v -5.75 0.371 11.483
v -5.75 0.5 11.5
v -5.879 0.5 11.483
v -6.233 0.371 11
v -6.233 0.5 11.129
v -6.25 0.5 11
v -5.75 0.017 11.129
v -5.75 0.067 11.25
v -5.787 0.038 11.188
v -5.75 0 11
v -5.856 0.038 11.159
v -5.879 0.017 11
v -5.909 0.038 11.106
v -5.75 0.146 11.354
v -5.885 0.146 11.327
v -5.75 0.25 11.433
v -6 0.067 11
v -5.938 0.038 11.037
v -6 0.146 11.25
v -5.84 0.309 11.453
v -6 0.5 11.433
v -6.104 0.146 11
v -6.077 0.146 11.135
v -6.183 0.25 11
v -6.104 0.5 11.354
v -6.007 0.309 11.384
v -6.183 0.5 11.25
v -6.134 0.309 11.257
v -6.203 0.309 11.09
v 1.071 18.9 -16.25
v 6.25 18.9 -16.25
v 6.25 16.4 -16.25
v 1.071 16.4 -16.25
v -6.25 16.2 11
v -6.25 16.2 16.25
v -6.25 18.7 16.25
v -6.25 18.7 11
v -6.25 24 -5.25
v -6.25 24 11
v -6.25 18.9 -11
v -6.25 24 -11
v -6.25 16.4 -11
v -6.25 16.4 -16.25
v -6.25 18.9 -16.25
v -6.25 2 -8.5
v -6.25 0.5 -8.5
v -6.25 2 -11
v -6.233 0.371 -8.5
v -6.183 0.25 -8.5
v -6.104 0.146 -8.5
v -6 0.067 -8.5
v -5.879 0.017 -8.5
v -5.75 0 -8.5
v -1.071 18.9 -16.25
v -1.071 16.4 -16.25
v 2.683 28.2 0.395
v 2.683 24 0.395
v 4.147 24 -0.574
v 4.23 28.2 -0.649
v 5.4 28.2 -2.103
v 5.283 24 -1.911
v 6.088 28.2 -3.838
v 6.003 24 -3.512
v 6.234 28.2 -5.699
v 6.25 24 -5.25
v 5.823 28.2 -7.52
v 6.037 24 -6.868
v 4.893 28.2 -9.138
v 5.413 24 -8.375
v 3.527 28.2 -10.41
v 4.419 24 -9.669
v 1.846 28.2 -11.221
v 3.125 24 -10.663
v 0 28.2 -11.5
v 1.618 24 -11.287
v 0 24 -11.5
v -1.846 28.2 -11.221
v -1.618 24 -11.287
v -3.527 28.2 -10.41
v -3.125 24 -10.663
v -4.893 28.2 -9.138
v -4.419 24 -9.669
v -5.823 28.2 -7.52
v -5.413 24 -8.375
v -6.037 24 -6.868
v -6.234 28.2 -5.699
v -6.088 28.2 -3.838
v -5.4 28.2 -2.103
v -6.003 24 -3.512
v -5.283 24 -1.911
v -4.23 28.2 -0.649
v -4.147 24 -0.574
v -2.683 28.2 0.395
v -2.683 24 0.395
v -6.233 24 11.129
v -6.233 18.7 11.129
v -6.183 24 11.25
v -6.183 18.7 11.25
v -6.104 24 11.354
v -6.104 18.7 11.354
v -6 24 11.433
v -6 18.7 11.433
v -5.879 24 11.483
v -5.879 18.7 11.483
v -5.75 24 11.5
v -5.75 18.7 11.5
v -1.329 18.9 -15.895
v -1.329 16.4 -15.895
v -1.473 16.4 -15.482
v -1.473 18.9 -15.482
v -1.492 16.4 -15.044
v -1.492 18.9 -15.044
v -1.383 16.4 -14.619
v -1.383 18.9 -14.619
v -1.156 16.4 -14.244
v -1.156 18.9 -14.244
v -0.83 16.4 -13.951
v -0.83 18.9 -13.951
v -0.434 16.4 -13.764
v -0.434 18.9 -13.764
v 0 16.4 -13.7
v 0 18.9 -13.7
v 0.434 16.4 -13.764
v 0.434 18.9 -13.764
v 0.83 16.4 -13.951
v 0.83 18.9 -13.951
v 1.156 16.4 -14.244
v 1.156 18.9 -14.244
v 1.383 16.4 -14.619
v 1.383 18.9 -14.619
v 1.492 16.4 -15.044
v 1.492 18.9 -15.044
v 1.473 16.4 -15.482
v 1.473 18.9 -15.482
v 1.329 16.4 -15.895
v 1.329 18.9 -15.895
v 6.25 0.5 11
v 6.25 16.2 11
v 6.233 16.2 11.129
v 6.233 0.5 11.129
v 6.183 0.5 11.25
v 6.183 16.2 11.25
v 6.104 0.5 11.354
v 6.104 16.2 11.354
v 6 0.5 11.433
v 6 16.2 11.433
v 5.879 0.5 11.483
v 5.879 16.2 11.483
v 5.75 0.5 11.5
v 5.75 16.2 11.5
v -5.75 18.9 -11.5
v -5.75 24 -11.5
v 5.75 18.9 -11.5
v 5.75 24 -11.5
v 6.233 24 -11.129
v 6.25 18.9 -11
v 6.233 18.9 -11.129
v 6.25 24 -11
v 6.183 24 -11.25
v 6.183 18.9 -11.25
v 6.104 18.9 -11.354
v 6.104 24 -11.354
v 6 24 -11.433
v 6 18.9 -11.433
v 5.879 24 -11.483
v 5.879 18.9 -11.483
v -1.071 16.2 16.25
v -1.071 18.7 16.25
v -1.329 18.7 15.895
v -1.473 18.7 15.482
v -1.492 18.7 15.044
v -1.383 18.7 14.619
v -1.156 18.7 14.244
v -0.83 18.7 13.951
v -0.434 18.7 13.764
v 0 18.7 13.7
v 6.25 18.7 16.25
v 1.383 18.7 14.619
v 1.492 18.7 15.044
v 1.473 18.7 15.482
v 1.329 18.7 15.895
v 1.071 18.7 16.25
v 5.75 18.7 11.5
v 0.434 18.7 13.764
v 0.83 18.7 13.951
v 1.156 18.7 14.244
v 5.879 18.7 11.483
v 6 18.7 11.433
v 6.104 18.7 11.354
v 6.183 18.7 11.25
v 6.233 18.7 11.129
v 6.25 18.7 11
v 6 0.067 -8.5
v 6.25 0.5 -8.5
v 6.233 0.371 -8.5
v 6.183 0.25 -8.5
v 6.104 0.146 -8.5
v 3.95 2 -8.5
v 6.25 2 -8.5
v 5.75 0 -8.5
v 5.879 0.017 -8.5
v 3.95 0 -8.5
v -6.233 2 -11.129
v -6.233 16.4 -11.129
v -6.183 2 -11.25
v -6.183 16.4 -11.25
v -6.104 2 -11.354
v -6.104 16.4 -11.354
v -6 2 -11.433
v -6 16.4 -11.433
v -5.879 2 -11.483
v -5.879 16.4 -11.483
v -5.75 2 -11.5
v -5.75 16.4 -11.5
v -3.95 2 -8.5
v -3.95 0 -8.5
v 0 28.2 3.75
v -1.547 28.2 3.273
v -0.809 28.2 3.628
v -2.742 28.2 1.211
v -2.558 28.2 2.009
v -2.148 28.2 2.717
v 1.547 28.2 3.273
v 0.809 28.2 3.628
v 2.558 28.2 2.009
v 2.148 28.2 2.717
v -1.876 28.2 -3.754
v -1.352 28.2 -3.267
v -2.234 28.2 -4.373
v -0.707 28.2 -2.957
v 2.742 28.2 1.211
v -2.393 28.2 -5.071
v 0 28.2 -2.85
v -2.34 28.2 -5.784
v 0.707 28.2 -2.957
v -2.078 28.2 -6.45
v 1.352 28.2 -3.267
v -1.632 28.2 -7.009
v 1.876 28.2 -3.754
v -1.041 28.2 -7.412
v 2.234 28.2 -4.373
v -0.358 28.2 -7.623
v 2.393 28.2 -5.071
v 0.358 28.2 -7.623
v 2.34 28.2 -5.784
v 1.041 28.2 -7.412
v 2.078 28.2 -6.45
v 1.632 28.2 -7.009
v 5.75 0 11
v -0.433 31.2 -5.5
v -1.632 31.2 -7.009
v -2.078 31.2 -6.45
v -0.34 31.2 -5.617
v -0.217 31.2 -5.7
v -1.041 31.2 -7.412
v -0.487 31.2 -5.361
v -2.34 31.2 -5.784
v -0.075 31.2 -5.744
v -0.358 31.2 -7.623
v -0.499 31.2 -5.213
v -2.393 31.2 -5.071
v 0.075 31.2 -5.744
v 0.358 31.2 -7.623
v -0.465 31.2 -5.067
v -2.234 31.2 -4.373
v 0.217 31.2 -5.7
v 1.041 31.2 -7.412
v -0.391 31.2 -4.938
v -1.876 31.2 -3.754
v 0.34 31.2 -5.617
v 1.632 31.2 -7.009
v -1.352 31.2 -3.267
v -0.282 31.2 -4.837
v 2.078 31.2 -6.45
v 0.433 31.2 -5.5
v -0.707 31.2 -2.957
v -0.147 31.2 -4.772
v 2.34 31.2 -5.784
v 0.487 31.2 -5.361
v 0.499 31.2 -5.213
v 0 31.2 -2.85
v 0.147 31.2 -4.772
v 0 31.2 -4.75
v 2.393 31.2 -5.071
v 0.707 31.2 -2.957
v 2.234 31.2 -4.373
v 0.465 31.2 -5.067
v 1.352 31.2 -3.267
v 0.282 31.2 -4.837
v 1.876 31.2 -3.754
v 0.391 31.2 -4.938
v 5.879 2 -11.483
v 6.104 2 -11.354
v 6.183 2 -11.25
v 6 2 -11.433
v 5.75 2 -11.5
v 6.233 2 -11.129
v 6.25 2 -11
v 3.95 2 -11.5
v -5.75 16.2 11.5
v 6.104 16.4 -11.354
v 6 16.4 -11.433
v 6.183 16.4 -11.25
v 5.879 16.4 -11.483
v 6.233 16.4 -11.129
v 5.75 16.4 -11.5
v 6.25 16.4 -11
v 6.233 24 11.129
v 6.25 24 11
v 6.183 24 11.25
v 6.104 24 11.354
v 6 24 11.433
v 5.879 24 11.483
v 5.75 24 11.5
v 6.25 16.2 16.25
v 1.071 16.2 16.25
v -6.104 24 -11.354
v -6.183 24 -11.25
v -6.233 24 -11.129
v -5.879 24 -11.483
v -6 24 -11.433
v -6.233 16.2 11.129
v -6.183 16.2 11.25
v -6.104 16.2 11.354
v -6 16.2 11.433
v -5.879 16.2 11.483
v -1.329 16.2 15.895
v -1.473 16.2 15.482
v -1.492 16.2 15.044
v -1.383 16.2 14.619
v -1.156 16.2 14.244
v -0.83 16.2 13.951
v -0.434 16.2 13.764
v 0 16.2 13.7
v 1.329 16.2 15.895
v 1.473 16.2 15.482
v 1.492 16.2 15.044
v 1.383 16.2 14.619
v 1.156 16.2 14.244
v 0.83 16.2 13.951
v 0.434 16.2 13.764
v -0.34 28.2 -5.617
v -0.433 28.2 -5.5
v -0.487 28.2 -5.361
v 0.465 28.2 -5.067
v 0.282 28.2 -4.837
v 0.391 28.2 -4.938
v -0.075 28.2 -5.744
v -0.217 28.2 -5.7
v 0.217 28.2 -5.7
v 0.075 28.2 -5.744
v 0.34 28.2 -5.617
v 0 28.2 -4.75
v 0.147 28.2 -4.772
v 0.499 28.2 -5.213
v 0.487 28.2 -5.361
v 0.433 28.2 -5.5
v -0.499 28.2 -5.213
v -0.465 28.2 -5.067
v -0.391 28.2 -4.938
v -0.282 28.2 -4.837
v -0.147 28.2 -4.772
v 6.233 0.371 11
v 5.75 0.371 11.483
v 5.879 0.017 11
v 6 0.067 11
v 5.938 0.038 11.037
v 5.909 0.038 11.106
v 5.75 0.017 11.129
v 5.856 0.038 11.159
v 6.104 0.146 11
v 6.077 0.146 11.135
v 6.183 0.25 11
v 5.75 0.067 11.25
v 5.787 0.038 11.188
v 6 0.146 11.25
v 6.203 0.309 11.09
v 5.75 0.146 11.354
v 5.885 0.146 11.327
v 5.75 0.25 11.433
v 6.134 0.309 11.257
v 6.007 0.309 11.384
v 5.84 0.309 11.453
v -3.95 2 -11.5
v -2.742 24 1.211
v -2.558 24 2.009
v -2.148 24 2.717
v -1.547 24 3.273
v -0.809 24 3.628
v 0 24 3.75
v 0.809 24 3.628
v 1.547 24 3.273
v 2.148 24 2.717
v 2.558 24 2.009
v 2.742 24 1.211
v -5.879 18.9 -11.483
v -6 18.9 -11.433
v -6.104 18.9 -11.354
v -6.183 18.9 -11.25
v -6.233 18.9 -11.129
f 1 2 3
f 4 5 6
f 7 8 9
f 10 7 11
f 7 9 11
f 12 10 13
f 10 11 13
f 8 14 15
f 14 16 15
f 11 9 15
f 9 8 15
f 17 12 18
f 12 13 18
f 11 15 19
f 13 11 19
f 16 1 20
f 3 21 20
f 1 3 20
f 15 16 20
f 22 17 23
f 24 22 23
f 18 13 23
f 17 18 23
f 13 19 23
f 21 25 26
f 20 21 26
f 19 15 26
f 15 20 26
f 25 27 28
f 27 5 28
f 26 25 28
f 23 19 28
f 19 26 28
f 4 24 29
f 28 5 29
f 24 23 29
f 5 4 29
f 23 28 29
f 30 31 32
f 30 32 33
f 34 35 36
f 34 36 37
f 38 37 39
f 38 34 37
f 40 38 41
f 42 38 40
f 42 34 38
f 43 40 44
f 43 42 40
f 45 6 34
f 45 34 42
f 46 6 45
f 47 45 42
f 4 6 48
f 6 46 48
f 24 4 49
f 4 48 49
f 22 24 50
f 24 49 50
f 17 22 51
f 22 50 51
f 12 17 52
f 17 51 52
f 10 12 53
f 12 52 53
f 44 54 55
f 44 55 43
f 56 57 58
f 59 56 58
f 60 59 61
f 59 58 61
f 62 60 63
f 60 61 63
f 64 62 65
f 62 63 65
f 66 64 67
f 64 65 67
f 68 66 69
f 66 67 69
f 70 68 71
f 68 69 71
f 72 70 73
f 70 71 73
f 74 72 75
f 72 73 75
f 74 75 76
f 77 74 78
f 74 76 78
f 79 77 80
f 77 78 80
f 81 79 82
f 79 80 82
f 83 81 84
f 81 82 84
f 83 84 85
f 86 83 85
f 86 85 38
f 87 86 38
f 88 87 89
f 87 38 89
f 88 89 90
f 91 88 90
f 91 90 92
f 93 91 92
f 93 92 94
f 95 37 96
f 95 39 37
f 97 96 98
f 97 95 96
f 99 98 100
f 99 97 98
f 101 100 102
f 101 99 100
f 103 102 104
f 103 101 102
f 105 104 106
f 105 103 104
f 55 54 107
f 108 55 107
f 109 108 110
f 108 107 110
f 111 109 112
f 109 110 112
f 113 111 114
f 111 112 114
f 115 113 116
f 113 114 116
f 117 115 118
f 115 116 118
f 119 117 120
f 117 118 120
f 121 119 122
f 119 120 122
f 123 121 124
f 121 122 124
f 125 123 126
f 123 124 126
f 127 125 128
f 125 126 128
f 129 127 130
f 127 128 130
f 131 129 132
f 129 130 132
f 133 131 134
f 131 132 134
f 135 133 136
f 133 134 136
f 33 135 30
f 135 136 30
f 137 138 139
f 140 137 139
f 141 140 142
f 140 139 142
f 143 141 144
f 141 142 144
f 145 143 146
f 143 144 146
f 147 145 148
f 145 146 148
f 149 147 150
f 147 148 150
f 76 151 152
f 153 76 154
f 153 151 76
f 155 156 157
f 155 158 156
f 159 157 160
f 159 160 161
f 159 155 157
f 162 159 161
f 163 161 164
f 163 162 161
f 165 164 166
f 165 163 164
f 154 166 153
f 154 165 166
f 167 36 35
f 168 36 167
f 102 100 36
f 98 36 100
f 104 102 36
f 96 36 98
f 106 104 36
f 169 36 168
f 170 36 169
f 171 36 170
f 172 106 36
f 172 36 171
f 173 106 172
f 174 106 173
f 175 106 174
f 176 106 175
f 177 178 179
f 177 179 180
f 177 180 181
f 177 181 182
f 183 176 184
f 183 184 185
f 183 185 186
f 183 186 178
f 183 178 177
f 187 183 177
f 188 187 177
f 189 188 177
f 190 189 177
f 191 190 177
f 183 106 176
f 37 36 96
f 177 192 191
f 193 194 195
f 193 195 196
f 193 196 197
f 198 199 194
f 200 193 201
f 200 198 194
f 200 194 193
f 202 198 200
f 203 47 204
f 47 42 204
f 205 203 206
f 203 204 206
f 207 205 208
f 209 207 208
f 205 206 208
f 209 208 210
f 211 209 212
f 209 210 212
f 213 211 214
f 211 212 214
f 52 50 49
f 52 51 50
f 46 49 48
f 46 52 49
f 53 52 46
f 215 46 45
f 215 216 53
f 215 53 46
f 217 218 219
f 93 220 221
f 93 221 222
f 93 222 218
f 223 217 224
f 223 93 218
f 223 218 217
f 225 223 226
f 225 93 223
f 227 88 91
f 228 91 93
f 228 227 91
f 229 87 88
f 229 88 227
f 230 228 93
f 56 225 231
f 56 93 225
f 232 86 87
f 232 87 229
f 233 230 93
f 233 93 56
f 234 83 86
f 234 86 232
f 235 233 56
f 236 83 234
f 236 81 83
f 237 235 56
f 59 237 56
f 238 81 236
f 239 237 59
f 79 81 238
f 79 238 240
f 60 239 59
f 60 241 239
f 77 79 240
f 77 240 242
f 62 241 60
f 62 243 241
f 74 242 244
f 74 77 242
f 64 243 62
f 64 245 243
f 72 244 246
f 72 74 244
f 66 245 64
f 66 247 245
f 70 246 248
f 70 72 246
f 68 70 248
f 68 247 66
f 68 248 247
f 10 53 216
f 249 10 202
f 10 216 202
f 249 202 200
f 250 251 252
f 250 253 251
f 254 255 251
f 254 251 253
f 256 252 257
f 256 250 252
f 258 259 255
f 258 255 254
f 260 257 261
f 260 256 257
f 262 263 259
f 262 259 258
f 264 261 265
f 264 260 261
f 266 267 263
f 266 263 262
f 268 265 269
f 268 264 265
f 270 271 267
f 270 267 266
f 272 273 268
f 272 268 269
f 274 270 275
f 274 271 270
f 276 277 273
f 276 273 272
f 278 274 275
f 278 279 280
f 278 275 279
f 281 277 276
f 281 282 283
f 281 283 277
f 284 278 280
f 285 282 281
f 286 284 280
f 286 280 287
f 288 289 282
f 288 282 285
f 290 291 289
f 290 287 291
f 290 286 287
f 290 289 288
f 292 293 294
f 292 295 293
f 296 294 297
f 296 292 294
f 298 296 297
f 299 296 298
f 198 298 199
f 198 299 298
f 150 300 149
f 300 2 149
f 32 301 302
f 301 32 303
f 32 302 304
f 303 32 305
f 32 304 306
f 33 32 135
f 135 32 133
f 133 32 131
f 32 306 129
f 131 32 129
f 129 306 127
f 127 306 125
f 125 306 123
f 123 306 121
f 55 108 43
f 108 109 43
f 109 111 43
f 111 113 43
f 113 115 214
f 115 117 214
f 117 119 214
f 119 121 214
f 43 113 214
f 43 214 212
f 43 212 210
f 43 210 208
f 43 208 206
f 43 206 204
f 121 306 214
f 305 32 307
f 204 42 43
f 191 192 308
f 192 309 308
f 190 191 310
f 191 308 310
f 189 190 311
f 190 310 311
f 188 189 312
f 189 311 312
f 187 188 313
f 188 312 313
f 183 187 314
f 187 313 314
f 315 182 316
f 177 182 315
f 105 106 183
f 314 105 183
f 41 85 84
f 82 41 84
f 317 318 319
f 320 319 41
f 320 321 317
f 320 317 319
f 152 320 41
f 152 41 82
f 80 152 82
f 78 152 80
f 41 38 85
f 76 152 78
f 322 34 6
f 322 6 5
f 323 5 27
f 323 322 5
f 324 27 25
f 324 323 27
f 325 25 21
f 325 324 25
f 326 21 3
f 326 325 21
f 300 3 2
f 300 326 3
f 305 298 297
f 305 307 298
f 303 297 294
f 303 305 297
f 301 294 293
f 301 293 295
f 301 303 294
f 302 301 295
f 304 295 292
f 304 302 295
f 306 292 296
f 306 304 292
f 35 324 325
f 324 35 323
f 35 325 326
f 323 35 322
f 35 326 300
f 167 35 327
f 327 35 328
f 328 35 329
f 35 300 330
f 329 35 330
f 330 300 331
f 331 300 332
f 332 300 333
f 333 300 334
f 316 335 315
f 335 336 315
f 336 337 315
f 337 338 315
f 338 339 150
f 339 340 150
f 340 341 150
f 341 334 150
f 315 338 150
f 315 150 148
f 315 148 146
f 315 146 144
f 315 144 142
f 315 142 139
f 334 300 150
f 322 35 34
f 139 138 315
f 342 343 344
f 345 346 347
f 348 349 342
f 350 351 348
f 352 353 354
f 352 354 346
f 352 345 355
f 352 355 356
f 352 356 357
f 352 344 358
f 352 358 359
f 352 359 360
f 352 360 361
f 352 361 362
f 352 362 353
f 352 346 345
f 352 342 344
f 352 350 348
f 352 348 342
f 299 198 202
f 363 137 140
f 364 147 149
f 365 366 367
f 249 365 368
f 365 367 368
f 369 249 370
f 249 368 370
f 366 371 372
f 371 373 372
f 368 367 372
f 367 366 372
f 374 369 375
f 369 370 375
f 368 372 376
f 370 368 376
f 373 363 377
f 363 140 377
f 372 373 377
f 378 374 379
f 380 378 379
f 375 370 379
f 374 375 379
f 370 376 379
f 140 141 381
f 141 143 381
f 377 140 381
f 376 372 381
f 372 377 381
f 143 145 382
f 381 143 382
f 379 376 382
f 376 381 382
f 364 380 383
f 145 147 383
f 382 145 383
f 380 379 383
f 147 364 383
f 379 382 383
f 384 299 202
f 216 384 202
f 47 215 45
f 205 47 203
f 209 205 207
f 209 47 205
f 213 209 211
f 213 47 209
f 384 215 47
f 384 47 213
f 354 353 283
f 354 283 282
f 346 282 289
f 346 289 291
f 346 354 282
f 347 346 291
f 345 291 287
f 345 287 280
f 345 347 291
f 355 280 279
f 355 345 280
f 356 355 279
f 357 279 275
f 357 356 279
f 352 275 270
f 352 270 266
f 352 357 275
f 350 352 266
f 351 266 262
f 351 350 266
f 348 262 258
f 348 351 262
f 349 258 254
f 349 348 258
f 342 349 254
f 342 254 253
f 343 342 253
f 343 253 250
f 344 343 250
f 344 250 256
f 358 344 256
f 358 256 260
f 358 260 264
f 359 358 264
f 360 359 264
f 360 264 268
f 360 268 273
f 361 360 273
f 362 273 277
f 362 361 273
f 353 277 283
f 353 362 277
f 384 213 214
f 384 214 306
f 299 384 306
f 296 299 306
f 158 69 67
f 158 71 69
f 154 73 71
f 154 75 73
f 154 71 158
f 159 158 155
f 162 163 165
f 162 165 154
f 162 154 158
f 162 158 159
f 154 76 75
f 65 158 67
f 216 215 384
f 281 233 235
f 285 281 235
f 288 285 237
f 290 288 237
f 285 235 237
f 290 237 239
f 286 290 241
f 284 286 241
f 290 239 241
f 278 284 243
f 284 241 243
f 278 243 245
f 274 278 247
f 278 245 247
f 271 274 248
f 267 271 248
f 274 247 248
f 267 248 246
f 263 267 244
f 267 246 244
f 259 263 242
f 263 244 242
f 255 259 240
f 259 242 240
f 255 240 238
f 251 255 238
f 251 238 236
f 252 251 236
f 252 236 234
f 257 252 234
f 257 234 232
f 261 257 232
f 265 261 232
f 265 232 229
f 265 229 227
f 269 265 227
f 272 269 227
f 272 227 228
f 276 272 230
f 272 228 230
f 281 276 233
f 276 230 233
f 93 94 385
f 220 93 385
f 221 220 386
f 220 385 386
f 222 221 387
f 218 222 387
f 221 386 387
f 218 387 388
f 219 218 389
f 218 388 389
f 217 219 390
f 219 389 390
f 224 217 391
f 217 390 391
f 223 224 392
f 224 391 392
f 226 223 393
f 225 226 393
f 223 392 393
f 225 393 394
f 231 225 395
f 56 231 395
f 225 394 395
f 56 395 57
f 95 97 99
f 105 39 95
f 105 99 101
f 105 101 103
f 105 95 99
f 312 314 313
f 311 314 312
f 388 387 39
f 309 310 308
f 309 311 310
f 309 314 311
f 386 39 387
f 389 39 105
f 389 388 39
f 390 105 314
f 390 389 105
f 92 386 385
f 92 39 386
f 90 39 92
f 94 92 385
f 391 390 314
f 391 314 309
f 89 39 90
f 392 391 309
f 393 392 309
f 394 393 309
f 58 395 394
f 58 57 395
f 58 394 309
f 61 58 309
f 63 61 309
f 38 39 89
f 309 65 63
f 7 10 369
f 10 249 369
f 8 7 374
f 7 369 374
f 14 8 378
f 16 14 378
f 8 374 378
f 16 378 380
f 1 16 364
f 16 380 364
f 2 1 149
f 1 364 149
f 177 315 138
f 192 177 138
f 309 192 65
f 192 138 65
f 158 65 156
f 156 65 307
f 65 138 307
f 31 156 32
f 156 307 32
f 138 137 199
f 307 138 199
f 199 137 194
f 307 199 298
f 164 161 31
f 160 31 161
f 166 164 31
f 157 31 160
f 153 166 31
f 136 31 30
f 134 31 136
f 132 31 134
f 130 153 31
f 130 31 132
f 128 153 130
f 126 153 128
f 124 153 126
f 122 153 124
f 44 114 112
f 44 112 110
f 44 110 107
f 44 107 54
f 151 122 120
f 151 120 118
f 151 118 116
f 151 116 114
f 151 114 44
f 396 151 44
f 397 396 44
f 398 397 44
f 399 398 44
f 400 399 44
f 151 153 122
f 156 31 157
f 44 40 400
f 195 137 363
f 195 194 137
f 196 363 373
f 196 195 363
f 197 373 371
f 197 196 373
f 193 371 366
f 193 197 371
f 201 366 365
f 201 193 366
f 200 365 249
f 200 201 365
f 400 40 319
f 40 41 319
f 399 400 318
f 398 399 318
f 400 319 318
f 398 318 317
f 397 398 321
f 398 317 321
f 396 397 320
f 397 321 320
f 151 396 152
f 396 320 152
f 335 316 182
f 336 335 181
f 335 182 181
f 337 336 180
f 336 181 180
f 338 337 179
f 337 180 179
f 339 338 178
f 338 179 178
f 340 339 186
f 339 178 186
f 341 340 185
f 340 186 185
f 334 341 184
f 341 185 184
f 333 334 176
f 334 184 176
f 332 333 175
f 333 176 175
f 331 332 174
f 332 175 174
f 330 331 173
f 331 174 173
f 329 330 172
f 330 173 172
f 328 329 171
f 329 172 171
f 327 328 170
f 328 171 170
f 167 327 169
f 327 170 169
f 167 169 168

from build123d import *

# Parameters (mm, degrees)
SKETCH1_W               = 12.5
SKETCH1_H               = 23
BOSS_EXTRUDE1_DEPTH     = 24
BOSS_EXTRUDE2_DEPTH     = 4.2
SKETCH3_R               = 2.4
SKETCH3_R_2             = 0.5
BOSS_EXTRUDE3_DEPTH     = 3
SKETCH4_W               = 12.5
SKETCH4_H               = 2.5
BOSS_EXTRUDE4_DEPTH     = 4.75
SKETCH5_W               = 12.5
SKETCH5_H               = 2.5
BOSS_EXTRUDE5_DEPTH     = 4.75
CUT_EXTRUDE1_REACH      = 27.55
SKETCH6_R               = 1.5
CUT_EXTRUDE2_REACH      = 27.697
SKETCH8_R               = 1.5
CUT_EXTRUDE4_DEPTH      = 38.33299479
CUT_EXTRUDE6_DEPTH      = 38.33299479
CUT_EXTRUDE6_DEPTH_BACK = 2.3
CUT_EXTRUDE7_DEPTH      = 38.33299479
CUT_EXTRUDE7_DEPTH_BACK = 2.3
FILLET1_R               = 0.5


with BuildPart() as part:
    # Sketch1 → Boss-Extrude1 (new body)
    with BuildSketch(Plane(origin=(0, 0, 0), x_dir=(1, 0, 0), z_dir=(0, 1, 0))):
        Rectangle(SKETCH1_W, SKETCH1_H)
    extrude(amount=BOSS_EXTRUDE1_DEPTH)

    # Sketch2 → Boss-Extrude2 (add)
    with BuildSketch(Plane(origin=(0, 24, 0), x_dir=(1, 0, 0), z_dir=(0, 1, 0))):
        with BuildLine():
            ThreePointArc((2.682624648, -0.395), (0, 11.5), (-2.682624648, -0.395))
            ThreePointArc((-2.682624648, -0.395), (0, -3.75), (2.682624648, -0.395))
        make_face()
    extrude(amount=BOSS_EXTRUDE2_DEPTH)

    # Sketch3 → Boss-Extrude3 (add)
    with BuildSketch(Plane(origin=(0, 28.2, 0), x_dir=(1, 0, 0), z_dir=(0, 1, 0))):
        with Locations(Location((0, 5.25, 0), (0, 0, 270))):
            Circle(SKETCH3_R)
        with Locations(Location((0, 5.25, 0), (0, 0, 270))):
            Circle(SKETCH3_R_2, mode=Mode.SUBTRACT)
    extrude(amount=BOSS_EXTRUDE3_DEPTH)

    # Sketch4 → Boss-Extrude4 (add)
    with BuildSketch(Plane(origin=(0, 0, -11.5), x_dir=(-1, 0, 0), z_dir=(0, 0, -1))):
        with Locations((0, 17.65)):
            Rectangle(SKETCH4_W, SKETCH4_H)
    extrude(amount=BOSS_EXTRUDE4_DEPTH)

    # Sketch5 → Boss-Extrude5 (add)
    with BuildSketch(Plane.XY.offset(11.5)):
        with Locations((0, 17.45)):
            Rectangle(SKETCH5_W, SKETCH5_H)
    extrude(amount=BOSS_EXTRUDE5_DEPTH)

    # Sketch6 → Cut-Extrude1 (cut, up to next)
    with BuildSketch(Plane(origin=(0, 18.7, 0), x_dir=(1, 0, 0), z_dir=(0, 1, 0)), mode=Mode.PRIVATE) as cut_extrude1_sk1:
        with Locations((0, -15.2)):
            Circle(SKETCH6_R)
    cut_extrude1_tool1 = extrude(cut_extrude1_sk1.sketch, amount=-CUT_EXTRUDE1_REACH, mode=Mode.PRIVATE) & part.part
    add(cut_extrude1_tool1.solids().sort_by_distance((0, 18.7, 15.2))[0], mode=Mode.SUBTRACT)

    # Sketch8 → Cut-Extrude2 (cut, up to next)
    with BuildSketch(Plane(origin=(0, 18.9, 0), x_dir=(1, 0, 0), z_dir=(0, 1, 0)), mode=Mode.PRIVATE) as cut_extrude2_sk1:
        with Locations((0, 15.2)):
            Circle(SKETCH8_R)
    cut_extrude2_tool1 = extrude(cut_extrude2_sk1.sketch, amount=-CUT_EXTRUDE2_REACH, mode=Mode.PRIVATE) & part.part
    add(cut_extrude2_tool1.solids().sort_by_distance((0, 18.9, -15.2))[0], mode=Mode.SUBTRACT)

    # Sketch9 → Cut-Extrude4 (cut, through all)
    with BuildSketch(Plane(origin=(6.25, 0, 0), x_dir=(0, 0, -1), z_dir=(1, 0, 0))):
        Polygon((11.5, 2), (8.5, 0), (11.5, 0), align=None)
    extrude(amount=-CUT_EXTRUDE4_DEPTH, mode=Mode.SUBTRACT)

    # Sketch10 → Cut-Extrude6 (cut, two sides: drawn at the far end of the back side and taken through both)
    with BuildSketch(Plane(origin=(6.25, 0, 0), x_dir=(0, 0, -1), z_dir=(1, 0, 0)).offset(-CUT_EXTRUDE6_DEPTH_BACK)):
        Polygon((102.065563363, 2), (11.5, 2), (8.5, 2), (8.5, 0), (8.5, -90.565563363), (135.889097577, -219.33086493), (229.45466094, -126.765301567), align=None)
    extrude(amount=CUT_EXTRUDE6_DEPTH + CUT_EXTRUDE6_DEPTH_BACK, mode=Mode.SUBTRACT)

    # Sketch11 → Cut-Extrude7 (cut, two sides: drawn at the far end of the back side and taken through both)
    with BuildSketch(Plane.ZY.offset(6.25).offset(-CUT_EXTRUDE7_DEPTH_BACK)):
        Polygon((-102.065563363, 2), (-11.5, 2), (-8.5, 2), (-8.5, 0), (-8.5, -90.565563363), (-135.889097577, -219.33086493), (-229.45466094, -126.765301567), align=None)
    extrude(amount=CUT_EXTRUDE7_DEPTH + CUT_EXTRUDE7_DEPTH_BACK, mode=Mode.SUBTRACT)

    # Fillet1
    fillet1_edges = [part.edges().sort_by_distance(p)[0] for p in [
        (-6.25, 9.2, -11.5),
        (6.25, 9.2, -11.5),
        (6.25, 8.1, 11.5),
        (-6.25, 8.1, 11.5),
        (6.25, 0, 1.5),
        (0, 0, 11.5),
        (-6.25, 21.45, -11.5),
        (6.25, 21.45, -11.5),
        (6.25, 21.35, 11.5),
        (-6.25, 0, 1.5),
        (-6.25, 21.35, 11.5),
    ]]
    fillet(fillet1_edges, radius=FILLET1_R)


solid = part.part
